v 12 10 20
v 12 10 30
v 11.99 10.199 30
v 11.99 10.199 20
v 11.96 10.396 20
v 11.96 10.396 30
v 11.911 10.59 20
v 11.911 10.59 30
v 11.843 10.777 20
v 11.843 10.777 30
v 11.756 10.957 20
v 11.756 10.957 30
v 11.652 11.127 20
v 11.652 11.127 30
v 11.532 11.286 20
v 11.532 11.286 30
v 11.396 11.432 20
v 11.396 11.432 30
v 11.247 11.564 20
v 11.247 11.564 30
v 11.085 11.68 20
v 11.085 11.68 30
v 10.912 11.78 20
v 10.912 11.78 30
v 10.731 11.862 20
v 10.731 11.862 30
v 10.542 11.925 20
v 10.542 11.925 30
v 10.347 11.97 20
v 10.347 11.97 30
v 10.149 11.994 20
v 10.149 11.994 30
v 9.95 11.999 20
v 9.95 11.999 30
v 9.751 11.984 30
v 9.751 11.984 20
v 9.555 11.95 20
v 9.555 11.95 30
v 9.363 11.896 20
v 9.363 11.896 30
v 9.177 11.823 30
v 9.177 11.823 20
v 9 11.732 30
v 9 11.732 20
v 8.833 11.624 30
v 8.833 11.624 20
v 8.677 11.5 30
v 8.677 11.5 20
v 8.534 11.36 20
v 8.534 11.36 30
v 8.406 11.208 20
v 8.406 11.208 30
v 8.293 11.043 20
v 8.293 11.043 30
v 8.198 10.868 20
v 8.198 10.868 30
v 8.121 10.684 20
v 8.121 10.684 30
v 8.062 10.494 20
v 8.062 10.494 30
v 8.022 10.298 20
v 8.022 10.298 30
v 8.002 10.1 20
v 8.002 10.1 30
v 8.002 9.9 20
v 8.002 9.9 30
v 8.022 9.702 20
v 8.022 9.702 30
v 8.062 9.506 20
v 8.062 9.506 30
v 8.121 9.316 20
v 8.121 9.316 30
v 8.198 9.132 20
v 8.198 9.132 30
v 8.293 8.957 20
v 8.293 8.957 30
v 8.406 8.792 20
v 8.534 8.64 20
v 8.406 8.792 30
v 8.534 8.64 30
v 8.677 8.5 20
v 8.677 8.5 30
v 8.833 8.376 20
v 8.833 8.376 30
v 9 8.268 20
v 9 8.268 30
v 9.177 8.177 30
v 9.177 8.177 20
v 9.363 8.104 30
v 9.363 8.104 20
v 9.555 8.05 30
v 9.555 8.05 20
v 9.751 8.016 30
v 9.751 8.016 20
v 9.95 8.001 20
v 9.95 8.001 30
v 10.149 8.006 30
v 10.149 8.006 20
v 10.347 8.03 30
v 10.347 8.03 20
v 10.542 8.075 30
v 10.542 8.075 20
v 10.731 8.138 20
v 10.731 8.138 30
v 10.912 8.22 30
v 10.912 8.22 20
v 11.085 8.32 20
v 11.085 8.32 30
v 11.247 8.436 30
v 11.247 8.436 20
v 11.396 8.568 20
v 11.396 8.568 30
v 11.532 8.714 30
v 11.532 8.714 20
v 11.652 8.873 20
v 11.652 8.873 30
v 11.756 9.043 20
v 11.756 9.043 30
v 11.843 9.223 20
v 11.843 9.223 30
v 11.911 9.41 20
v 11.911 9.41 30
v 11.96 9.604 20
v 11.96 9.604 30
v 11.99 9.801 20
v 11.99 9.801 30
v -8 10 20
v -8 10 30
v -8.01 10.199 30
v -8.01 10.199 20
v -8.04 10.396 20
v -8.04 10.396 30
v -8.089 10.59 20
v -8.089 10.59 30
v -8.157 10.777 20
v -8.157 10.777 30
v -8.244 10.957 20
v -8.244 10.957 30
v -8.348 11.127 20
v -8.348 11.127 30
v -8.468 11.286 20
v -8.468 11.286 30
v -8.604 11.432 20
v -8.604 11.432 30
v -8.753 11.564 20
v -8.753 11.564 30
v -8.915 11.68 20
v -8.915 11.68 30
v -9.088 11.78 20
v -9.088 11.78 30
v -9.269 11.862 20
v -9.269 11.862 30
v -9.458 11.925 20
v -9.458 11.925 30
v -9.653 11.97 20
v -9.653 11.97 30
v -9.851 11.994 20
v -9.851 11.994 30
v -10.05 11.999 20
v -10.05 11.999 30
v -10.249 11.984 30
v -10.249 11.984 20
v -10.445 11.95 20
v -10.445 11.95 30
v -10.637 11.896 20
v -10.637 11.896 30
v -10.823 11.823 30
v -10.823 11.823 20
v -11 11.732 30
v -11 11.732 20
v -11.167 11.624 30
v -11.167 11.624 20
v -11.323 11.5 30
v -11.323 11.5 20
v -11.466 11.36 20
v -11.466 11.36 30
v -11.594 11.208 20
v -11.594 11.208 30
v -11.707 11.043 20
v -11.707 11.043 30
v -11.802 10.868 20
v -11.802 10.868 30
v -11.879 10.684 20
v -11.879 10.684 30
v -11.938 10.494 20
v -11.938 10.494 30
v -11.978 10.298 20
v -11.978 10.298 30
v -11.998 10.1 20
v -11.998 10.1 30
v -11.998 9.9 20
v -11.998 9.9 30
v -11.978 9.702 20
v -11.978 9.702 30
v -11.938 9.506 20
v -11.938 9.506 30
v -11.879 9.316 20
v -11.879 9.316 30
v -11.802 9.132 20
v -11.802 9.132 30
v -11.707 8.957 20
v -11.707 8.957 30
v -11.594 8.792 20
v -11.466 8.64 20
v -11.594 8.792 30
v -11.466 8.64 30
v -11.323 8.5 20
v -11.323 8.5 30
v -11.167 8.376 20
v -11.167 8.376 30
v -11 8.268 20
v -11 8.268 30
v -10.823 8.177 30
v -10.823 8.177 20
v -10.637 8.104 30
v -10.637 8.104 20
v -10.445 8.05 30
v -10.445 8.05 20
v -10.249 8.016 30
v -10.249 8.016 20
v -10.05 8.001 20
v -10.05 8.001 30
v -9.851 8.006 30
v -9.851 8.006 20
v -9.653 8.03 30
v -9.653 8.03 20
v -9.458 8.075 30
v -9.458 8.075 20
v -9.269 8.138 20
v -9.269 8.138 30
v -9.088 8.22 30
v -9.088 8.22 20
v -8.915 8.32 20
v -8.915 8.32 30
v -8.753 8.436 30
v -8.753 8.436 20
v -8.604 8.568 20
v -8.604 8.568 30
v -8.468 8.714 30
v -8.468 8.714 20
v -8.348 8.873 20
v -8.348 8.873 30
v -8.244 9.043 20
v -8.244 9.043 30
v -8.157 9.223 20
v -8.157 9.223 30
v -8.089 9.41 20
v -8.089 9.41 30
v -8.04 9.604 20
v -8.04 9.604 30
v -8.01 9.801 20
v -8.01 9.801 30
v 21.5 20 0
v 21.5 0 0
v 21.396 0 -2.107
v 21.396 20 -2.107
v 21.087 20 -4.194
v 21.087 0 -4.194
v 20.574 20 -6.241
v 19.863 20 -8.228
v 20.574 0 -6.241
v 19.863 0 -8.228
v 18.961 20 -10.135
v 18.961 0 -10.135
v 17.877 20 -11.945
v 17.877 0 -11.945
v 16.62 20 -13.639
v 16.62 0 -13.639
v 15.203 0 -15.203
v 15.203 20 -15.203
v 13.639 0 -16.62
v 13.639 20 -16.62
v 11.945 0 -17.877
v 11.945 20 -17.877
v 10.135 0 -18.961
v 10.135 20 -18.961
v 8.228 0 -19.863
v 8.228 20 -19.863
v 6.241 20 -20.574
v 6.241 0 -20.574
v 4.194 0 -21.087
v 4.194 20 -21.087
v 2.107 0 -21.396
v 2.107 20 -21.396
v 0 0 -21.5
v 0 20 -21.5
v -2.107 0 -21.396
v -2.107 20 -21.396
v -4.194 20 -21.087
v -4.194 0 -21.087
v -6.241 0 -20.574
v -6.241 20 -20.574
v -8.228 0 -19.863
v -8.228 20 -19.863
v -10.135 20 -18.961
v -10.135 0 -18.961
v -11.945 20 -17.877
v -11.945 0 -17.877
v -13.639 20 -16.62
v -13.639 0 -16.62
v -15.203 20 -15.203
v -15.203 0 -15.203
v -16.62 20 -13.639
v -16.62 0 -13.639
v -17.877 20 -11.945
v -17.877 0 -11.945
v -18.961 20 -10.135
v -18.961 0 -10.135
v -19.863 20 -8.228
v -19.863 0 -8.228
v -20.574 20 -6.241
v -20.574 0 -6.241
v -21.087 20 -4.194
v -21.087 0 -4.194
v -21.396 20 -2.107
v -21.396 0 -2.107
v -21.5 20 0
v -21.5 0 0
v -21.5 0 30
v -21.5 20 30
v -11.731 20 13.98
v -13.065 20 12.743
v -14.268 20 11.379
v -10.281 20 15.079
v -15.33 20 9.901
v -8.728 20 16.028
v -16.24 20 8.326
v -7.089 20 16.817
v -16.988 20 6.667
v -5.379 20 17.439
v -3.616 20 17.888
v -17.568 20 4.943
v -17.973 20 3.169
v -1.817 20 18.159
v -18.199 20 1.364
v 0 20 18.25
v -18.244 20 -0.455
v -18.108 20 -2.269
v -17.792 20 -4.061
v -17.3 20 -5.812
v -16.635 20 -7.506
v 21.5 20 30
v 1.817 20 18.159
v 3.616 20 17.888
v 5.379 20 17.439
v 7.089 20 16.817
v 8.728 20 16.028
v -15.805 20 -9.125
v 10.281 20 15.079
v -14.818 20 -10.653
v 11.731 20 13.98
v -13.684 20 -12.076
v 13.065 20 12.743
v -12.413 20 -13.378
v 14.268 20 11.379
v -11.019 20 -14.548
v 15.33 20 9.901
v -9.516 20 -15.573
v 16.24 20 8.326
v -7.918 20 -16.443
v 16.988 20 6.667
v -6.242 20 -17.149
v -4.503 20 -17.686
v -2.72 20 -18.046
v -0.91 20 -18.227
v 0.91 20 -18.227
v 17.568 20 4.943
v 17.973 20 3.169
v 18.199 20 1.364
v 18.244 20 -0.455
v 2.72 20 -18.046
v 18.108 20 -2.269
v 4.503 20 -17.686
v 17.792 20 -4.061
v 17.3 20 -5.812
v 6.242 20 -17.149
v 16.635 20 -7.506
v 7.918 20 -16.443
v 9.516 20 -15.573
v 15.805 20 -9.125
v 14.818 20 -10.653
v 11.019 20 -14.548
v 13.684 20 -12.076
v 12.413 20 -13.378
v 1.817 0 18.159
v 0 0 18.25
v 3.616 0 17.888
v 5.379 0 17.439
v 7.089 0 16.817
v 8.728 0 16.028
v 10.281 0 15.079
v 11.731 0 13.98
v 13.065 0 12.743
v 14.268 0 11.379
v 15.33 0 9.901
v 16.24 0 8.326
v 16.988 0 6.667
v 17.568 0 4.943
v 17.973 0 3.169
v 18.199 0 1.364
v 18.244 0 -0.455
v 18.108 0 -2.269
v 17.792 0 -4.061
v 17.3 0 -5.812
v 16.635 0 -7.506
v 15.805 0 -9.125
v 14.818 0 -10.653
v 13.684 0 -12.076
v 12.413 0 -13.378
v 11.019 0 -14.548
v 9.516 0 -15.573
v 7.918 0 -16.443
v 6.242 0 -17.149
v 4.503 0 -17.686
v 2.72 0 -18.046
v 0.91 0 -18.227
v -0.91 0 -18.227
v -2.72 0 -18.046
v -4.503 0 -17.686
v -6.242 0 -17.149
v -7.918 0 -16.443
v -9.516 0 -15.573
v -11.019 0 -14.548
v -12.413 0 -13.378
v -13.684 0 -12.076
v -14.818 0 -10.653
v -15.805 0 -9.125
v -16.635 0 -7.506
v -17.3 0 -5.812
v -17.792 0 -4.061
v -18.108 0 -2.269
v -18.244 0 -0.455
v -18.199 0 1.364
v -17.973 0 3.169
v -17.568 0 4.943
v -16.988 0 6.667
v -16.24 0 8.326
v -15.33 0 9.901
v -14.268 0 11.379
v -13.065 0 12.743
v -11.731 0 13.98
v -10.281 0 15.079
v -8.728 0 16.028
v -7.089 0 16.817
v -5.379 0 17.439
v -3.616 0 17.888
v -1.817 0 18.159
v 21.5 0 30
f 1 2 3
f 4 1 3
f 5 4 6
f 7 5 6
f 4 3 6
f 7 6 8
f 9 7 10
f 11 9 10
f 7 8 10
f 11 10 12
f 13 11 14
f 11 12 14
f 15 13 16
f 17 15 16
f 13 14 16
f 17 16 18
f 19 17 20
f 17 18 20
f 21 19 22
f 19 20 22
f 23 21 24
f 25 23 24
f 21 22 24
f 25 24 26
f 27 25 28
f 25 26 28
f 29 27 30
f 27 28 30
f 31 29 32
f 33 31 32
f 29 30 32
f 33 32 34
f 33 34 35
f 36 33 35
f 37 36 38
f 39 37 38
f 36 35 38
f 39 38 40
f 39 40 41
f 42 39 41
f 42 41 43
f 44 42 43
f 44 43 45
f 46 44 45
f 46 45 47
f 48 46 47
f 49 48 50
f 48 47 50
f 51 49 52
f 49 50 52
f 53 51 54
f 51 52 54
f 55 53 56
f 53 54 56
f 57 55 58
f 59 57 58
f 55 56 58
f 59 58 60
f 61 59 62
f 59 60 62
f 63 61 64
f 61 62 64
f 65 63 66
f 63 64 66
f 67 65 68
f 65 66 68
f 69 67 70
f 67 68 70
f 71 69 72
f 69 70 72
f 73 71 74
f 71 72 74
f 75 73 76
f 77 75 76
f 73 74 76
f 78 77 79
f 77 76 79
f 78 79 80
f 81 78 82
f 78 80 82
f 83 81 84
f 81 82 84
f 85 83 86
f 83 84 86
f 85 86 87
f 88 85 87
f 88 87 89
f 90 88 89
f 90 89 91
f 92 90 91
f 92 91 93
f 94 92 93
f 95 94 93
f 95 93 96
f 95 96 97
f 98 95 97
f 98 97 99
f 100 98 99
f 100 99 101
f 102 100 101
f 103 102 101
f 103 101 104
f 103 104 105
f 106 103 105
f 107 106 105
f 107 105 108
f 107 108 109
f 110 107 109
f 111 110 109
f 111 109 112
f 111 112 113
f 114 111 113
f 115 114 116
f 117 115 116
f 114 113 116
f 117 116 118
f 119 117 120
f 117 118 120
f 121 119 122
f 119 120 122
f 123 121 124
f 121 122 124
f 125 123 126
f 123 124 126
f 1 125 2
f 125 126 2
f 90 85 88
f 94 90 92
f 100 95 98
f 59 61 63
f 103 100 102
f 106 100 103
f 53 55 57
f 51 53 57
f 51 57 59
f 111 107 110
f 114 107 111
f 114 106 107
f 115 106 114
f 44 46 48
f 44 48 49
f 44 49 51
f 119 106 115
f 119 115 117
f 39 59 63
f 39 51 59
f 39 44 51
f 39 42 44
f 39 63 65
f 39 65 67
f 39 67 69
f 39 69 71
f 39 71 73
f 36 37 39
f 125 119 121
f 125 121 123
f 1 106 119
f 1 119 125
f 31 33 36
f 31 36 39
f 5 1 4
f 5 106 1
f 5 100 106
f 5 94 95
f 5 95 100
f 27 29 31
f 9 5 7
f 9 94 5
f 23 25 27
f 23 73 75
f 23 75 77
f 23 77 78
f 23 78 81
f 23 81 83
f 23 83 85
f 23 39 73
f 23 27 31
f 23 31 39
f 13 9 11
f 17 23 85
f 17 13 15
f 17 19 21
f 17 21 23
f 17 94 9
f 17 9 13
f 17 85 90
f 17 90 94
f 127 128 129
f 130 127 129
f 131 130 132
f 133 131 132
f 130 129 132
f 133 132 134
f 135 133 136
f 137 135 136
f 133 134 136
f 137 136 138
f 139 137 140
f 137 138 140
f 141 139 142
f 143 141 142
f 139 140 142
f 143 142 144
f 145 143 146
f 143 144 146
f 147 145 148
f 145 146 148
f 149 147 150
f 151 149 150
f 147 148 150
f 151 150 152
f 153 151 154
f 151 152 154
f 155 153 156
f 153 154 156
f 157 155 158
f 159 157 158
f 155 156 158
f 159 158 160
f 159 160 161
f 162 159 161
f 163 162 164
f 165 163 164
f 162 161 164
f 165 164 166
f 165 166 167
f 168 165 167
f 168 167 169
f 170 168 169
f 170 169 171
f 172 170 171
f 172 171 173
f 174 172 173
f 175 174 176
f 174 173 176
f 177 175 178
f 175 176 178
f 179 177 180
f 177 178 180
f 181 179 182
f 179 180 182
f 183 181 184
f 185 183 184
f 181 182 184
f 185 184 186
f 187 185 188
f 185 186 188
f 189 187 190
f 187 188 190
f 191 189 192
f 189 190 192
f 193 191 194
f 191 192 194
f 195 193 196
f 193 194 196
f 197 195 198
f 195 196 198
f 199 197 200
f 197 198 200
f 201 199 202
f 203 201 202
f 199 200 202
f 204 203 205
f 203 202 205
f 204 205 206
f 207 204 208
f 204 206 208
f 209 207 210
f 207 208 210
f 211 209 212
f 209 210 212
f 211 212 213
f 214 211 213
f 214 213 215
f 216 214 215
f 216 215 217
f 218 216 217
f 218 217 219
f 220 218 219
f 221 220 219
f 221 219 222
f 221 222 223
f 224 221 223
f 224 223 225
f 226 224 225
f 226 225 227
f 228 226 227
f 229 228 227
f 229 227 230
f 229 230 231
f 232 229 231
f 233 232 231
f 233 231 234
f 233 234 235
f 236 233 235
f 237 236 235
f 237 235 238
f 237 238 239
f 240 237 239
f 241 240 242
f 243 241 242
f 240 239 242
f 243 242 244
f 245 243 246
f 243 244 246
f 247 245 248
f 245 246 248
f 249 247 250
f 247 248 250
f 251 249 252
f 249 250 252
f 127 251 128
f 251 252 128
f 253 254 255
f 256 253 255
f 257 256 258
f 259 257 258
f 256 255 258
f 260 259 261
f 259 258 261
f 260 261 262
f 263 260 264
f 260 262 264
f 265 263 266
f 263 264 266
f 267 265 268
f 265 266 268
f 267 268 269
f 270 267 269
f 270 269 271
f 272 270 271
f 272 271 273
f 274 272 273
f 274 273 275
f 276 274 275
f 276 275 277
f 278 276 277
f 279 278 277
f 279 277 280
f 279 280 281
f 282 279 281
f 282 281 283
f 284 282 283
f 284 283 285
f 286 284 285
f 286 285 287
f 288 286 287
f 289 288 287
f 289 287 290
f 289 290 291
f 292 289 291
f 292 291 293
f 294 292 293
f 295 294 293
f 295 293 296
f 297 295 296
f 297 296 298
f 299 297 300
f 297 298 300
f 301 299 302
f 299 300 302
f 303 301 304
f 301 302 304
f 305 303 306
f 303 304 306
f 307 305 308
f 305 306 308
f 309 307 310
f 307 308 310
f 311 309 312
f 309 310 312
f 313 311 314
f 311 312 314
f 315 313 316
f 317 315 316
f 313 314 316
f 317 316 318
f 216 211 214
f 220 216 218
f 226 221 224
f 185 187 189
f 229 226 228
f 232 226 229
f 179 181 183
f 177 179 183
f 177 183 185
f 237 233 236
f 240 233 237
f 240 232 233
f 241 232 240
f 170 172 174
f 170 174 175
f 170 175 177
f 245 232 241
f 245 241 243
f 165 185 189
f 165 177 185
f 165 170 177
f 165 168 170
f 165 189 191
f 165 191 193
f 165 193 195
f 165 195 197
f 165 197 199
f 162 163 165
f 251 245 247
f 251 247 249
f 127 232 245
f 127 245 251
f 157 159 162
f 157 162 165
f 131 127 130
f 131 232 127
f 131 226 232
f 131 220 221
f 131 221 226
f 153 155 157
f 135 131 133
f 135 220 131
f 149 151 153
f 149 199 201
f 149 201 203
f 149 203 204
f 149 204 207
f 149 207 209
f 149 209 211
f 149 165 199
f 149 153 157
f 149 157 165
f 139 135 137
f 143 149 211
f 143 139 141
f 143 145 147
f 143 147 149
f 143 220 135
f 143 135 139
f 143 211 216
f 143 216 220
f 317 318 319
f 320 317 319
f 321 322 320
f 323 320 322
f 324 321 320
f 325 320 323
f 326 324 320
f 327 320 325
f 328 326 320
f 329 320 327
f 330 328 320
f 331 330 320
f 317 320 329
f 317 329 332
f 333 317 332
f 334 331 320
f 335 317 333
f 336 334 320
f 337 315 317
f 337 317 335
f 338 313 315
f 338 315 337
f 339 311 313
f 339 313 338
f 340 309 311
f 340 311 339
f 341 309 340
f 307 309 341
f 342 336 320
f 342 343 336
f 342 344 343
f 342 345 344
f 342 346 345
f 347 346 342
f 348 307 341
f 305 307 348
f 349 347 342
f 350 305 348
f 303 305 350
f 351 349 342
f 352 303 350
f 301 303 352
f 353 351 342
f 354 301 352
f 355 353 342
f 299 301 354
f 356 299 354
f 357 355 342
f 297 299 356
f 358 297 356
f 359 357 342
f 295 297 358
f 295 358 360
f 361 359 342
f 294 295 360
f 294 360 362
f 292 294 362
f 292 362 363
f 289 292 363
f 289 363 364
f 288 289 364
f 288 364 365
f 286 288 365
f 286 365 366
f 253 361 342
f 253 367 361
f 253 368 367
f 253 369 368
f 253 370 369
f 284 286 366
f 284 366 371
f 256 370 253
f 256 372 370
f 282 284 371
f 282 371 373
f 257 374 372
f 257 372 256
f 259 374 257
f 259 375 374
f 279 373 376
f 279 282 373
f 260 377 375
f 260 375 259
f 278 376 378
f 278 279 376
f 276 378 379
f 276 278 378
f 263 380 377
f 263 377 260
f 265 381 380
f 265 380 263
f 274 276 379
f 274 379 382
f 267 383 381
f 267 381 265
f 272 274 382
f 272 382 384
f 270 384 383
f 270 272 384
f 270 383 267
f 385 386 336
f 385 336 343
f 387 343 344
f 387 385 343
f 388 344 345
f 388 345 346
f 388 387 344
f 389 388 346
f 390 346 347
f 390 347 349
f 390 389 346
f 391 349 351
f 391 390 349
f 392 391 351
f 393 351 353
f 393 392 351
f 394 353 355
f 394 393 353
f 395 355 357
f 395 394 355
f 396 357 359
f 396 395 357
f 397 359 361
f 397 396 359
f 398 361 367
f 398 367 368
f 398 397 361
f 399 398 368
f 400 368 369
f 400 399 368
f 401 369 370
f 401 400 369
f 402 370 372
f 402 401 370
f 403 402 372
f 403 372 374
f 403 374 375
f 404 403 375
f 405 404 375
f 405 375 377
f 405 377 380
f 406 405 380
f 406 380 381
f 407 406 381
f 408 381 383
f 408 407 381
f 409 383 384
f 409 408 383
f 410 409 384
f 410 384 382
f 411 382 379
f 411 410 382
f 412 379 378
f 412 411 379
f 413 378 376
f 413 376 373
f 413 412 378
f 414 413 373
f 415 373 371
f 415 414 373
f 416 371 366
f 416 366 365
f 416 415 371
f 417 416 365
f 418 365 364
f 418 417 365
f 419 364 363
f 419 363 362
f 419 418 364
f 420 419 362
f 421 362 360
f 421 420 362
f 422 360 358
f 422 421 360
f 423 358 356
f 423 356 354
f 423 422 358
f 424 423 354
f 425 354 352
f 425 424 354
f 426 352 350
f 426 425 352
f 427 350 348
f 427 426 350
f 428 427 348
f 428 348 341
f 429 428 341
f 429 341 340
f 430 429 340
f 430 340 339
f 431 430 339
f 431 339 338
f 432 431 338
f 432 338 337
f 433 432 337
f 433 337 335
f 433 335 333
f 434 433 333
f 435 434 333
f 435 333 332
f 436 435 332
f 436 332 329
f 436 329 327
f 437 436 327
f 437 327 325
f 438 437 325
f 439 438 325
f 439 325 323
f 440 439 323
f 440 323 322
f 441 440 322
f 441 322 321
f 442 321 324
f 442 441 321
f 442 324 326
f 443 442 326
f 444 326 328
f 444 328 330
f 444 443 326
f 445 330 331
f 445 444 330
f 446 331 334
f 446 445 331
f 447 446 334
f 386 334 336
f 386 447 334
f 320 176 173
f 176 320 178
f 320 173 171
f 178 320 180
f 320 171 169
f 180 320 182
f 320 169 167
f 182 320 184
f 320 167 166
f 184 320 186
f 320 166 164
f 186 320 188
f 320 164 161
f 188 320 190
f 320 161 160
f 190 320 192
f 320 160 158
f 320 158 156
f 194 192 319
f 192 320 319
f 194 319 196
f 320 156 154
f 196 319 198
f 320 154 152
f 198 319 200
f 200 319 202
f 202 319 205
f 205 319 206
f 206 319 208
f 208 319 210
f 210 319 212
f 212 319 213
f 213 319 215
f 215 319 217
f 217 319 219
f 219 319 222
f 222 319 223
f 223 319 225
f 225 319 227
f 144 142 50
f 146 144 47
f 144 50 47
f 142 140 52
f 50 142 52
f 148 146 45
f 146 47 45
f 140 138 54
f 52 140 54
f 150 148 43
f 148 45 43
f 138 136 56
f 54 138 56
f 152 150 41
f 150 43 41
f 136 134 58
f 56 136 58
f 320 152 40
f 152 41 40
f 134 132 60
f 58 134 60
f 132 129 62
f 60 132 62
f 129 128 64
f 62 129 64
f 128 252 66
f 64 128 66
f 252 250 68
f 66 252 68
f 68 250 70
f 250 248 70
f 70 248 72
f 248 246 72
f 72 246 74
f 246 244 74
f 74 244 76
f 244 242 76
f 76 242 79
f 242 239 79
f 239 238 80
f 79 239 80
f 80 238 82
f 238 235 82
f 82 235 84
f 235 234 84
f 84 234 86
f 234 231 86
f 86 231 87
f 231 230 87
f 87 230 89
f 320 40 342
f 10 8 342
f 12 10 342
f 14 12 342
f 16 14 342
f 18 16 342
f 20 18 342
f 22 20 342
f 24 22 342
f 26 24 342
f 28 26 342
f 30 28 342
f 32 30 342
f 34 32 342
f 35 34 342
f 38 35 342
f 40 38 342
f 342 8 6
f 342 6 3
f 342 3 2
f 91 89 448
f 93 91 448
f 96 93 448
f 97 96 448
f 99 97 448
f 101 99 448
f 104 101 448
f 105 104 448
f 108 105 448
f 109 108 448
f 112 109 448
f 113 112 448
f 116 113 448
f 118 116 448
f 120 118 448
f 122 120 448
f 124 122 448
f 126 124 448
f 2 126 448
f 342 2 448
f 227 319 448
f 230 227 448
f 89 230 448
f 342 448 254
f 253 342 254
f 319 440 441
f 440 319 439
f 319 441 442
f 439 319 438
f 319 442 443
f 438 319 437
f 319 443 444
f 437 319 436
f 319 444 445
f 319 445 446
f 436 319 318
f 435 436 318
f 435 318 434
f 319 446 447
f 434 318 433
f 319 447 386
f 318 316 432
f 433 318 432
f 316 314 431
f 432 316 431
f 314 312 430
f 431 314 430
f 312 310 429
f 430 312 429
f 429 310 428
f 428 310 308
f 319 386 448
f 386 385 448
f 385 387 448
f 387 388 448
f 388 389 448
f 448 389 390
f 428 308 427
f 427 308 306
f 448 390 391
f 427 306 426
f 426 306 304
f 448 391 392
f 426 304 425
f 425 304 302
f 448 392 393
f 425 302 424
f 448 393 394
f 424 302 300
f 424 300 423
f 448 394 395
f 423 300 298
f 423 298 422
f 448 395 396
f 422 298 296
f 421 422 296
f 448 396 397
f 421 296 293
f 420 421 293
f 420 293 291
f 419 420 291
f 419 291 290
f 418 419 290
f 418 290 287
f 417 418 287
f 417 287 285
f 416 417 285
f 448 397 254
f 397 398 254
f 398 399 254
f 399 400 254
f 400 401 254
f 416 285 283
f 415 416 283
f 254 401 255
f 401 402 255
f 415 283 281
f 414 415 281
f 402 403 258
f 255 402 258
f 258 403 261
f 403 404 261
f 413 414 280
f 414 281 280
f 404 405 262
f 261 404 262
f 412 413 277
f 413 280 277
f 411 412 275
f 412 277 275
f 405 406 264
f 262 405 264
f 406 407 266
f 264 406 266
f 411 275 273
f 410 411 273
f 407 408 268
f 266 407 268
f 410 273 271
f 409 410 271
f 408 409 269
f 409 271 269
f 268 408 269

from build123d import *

# Parameters (mm, degrees)
SKETCH1_R           = 21.5
SKETCH1_R_2         = 18.25
BOSS_EXTRUDE1_DEPTH = 20
SKETCH2_R           = 2
CUT_EXTRUDE1_DEPTH  = 10


with BuildPart() as part:
    # Sketch1 → Boss-Extrude1 (new body)
    # profile 1 of 2: a face of its own
    with BuildSketch(Plane(origin=(0, 0, 0), x_dir=(1, 0, 0), z_dir=(0, 1, 0))):
        with BuildLine():
            ThreePointArc((21.5, 0), (0, -21.5), (-21.5, 0))
            Line((-21.5, 0), (-21.5, -30))
            Line((-21.5, -30), (21.5, -30))
            Line((21.5, -30), (21.5, 0))
        make_face()
    # profile 2 of 2: a face of its own
    with BuildSketch(Plane(origin=(0, 0, 0), x_dir=(1, 0, 0), z_dir=(0, 1, 0))):
        Circle(SKETCH1_R)
        with Locations(Location((0, 0, 0), (0, 0, 270))):
            Circle(SKETCH1_R_2, mode=Mode.SUBTRACT)
    extrude(amount=BOSS_EXTRUDE1_DEPTH)

    # Sketch2 → Cut-Extrude1 (cut)
    with BuildSketch(Plane.XY.offset(30)):
        with Locations((-10, 10)):
            Circle(SKETCH2_R)
        with Locations((10, 10)):
            Circle(SKETCH2_R)
    extrude(amount=-CUT_EXTRUDE1_DEPTH, mode=Mode.SUBTRACT)


solid = part.part
